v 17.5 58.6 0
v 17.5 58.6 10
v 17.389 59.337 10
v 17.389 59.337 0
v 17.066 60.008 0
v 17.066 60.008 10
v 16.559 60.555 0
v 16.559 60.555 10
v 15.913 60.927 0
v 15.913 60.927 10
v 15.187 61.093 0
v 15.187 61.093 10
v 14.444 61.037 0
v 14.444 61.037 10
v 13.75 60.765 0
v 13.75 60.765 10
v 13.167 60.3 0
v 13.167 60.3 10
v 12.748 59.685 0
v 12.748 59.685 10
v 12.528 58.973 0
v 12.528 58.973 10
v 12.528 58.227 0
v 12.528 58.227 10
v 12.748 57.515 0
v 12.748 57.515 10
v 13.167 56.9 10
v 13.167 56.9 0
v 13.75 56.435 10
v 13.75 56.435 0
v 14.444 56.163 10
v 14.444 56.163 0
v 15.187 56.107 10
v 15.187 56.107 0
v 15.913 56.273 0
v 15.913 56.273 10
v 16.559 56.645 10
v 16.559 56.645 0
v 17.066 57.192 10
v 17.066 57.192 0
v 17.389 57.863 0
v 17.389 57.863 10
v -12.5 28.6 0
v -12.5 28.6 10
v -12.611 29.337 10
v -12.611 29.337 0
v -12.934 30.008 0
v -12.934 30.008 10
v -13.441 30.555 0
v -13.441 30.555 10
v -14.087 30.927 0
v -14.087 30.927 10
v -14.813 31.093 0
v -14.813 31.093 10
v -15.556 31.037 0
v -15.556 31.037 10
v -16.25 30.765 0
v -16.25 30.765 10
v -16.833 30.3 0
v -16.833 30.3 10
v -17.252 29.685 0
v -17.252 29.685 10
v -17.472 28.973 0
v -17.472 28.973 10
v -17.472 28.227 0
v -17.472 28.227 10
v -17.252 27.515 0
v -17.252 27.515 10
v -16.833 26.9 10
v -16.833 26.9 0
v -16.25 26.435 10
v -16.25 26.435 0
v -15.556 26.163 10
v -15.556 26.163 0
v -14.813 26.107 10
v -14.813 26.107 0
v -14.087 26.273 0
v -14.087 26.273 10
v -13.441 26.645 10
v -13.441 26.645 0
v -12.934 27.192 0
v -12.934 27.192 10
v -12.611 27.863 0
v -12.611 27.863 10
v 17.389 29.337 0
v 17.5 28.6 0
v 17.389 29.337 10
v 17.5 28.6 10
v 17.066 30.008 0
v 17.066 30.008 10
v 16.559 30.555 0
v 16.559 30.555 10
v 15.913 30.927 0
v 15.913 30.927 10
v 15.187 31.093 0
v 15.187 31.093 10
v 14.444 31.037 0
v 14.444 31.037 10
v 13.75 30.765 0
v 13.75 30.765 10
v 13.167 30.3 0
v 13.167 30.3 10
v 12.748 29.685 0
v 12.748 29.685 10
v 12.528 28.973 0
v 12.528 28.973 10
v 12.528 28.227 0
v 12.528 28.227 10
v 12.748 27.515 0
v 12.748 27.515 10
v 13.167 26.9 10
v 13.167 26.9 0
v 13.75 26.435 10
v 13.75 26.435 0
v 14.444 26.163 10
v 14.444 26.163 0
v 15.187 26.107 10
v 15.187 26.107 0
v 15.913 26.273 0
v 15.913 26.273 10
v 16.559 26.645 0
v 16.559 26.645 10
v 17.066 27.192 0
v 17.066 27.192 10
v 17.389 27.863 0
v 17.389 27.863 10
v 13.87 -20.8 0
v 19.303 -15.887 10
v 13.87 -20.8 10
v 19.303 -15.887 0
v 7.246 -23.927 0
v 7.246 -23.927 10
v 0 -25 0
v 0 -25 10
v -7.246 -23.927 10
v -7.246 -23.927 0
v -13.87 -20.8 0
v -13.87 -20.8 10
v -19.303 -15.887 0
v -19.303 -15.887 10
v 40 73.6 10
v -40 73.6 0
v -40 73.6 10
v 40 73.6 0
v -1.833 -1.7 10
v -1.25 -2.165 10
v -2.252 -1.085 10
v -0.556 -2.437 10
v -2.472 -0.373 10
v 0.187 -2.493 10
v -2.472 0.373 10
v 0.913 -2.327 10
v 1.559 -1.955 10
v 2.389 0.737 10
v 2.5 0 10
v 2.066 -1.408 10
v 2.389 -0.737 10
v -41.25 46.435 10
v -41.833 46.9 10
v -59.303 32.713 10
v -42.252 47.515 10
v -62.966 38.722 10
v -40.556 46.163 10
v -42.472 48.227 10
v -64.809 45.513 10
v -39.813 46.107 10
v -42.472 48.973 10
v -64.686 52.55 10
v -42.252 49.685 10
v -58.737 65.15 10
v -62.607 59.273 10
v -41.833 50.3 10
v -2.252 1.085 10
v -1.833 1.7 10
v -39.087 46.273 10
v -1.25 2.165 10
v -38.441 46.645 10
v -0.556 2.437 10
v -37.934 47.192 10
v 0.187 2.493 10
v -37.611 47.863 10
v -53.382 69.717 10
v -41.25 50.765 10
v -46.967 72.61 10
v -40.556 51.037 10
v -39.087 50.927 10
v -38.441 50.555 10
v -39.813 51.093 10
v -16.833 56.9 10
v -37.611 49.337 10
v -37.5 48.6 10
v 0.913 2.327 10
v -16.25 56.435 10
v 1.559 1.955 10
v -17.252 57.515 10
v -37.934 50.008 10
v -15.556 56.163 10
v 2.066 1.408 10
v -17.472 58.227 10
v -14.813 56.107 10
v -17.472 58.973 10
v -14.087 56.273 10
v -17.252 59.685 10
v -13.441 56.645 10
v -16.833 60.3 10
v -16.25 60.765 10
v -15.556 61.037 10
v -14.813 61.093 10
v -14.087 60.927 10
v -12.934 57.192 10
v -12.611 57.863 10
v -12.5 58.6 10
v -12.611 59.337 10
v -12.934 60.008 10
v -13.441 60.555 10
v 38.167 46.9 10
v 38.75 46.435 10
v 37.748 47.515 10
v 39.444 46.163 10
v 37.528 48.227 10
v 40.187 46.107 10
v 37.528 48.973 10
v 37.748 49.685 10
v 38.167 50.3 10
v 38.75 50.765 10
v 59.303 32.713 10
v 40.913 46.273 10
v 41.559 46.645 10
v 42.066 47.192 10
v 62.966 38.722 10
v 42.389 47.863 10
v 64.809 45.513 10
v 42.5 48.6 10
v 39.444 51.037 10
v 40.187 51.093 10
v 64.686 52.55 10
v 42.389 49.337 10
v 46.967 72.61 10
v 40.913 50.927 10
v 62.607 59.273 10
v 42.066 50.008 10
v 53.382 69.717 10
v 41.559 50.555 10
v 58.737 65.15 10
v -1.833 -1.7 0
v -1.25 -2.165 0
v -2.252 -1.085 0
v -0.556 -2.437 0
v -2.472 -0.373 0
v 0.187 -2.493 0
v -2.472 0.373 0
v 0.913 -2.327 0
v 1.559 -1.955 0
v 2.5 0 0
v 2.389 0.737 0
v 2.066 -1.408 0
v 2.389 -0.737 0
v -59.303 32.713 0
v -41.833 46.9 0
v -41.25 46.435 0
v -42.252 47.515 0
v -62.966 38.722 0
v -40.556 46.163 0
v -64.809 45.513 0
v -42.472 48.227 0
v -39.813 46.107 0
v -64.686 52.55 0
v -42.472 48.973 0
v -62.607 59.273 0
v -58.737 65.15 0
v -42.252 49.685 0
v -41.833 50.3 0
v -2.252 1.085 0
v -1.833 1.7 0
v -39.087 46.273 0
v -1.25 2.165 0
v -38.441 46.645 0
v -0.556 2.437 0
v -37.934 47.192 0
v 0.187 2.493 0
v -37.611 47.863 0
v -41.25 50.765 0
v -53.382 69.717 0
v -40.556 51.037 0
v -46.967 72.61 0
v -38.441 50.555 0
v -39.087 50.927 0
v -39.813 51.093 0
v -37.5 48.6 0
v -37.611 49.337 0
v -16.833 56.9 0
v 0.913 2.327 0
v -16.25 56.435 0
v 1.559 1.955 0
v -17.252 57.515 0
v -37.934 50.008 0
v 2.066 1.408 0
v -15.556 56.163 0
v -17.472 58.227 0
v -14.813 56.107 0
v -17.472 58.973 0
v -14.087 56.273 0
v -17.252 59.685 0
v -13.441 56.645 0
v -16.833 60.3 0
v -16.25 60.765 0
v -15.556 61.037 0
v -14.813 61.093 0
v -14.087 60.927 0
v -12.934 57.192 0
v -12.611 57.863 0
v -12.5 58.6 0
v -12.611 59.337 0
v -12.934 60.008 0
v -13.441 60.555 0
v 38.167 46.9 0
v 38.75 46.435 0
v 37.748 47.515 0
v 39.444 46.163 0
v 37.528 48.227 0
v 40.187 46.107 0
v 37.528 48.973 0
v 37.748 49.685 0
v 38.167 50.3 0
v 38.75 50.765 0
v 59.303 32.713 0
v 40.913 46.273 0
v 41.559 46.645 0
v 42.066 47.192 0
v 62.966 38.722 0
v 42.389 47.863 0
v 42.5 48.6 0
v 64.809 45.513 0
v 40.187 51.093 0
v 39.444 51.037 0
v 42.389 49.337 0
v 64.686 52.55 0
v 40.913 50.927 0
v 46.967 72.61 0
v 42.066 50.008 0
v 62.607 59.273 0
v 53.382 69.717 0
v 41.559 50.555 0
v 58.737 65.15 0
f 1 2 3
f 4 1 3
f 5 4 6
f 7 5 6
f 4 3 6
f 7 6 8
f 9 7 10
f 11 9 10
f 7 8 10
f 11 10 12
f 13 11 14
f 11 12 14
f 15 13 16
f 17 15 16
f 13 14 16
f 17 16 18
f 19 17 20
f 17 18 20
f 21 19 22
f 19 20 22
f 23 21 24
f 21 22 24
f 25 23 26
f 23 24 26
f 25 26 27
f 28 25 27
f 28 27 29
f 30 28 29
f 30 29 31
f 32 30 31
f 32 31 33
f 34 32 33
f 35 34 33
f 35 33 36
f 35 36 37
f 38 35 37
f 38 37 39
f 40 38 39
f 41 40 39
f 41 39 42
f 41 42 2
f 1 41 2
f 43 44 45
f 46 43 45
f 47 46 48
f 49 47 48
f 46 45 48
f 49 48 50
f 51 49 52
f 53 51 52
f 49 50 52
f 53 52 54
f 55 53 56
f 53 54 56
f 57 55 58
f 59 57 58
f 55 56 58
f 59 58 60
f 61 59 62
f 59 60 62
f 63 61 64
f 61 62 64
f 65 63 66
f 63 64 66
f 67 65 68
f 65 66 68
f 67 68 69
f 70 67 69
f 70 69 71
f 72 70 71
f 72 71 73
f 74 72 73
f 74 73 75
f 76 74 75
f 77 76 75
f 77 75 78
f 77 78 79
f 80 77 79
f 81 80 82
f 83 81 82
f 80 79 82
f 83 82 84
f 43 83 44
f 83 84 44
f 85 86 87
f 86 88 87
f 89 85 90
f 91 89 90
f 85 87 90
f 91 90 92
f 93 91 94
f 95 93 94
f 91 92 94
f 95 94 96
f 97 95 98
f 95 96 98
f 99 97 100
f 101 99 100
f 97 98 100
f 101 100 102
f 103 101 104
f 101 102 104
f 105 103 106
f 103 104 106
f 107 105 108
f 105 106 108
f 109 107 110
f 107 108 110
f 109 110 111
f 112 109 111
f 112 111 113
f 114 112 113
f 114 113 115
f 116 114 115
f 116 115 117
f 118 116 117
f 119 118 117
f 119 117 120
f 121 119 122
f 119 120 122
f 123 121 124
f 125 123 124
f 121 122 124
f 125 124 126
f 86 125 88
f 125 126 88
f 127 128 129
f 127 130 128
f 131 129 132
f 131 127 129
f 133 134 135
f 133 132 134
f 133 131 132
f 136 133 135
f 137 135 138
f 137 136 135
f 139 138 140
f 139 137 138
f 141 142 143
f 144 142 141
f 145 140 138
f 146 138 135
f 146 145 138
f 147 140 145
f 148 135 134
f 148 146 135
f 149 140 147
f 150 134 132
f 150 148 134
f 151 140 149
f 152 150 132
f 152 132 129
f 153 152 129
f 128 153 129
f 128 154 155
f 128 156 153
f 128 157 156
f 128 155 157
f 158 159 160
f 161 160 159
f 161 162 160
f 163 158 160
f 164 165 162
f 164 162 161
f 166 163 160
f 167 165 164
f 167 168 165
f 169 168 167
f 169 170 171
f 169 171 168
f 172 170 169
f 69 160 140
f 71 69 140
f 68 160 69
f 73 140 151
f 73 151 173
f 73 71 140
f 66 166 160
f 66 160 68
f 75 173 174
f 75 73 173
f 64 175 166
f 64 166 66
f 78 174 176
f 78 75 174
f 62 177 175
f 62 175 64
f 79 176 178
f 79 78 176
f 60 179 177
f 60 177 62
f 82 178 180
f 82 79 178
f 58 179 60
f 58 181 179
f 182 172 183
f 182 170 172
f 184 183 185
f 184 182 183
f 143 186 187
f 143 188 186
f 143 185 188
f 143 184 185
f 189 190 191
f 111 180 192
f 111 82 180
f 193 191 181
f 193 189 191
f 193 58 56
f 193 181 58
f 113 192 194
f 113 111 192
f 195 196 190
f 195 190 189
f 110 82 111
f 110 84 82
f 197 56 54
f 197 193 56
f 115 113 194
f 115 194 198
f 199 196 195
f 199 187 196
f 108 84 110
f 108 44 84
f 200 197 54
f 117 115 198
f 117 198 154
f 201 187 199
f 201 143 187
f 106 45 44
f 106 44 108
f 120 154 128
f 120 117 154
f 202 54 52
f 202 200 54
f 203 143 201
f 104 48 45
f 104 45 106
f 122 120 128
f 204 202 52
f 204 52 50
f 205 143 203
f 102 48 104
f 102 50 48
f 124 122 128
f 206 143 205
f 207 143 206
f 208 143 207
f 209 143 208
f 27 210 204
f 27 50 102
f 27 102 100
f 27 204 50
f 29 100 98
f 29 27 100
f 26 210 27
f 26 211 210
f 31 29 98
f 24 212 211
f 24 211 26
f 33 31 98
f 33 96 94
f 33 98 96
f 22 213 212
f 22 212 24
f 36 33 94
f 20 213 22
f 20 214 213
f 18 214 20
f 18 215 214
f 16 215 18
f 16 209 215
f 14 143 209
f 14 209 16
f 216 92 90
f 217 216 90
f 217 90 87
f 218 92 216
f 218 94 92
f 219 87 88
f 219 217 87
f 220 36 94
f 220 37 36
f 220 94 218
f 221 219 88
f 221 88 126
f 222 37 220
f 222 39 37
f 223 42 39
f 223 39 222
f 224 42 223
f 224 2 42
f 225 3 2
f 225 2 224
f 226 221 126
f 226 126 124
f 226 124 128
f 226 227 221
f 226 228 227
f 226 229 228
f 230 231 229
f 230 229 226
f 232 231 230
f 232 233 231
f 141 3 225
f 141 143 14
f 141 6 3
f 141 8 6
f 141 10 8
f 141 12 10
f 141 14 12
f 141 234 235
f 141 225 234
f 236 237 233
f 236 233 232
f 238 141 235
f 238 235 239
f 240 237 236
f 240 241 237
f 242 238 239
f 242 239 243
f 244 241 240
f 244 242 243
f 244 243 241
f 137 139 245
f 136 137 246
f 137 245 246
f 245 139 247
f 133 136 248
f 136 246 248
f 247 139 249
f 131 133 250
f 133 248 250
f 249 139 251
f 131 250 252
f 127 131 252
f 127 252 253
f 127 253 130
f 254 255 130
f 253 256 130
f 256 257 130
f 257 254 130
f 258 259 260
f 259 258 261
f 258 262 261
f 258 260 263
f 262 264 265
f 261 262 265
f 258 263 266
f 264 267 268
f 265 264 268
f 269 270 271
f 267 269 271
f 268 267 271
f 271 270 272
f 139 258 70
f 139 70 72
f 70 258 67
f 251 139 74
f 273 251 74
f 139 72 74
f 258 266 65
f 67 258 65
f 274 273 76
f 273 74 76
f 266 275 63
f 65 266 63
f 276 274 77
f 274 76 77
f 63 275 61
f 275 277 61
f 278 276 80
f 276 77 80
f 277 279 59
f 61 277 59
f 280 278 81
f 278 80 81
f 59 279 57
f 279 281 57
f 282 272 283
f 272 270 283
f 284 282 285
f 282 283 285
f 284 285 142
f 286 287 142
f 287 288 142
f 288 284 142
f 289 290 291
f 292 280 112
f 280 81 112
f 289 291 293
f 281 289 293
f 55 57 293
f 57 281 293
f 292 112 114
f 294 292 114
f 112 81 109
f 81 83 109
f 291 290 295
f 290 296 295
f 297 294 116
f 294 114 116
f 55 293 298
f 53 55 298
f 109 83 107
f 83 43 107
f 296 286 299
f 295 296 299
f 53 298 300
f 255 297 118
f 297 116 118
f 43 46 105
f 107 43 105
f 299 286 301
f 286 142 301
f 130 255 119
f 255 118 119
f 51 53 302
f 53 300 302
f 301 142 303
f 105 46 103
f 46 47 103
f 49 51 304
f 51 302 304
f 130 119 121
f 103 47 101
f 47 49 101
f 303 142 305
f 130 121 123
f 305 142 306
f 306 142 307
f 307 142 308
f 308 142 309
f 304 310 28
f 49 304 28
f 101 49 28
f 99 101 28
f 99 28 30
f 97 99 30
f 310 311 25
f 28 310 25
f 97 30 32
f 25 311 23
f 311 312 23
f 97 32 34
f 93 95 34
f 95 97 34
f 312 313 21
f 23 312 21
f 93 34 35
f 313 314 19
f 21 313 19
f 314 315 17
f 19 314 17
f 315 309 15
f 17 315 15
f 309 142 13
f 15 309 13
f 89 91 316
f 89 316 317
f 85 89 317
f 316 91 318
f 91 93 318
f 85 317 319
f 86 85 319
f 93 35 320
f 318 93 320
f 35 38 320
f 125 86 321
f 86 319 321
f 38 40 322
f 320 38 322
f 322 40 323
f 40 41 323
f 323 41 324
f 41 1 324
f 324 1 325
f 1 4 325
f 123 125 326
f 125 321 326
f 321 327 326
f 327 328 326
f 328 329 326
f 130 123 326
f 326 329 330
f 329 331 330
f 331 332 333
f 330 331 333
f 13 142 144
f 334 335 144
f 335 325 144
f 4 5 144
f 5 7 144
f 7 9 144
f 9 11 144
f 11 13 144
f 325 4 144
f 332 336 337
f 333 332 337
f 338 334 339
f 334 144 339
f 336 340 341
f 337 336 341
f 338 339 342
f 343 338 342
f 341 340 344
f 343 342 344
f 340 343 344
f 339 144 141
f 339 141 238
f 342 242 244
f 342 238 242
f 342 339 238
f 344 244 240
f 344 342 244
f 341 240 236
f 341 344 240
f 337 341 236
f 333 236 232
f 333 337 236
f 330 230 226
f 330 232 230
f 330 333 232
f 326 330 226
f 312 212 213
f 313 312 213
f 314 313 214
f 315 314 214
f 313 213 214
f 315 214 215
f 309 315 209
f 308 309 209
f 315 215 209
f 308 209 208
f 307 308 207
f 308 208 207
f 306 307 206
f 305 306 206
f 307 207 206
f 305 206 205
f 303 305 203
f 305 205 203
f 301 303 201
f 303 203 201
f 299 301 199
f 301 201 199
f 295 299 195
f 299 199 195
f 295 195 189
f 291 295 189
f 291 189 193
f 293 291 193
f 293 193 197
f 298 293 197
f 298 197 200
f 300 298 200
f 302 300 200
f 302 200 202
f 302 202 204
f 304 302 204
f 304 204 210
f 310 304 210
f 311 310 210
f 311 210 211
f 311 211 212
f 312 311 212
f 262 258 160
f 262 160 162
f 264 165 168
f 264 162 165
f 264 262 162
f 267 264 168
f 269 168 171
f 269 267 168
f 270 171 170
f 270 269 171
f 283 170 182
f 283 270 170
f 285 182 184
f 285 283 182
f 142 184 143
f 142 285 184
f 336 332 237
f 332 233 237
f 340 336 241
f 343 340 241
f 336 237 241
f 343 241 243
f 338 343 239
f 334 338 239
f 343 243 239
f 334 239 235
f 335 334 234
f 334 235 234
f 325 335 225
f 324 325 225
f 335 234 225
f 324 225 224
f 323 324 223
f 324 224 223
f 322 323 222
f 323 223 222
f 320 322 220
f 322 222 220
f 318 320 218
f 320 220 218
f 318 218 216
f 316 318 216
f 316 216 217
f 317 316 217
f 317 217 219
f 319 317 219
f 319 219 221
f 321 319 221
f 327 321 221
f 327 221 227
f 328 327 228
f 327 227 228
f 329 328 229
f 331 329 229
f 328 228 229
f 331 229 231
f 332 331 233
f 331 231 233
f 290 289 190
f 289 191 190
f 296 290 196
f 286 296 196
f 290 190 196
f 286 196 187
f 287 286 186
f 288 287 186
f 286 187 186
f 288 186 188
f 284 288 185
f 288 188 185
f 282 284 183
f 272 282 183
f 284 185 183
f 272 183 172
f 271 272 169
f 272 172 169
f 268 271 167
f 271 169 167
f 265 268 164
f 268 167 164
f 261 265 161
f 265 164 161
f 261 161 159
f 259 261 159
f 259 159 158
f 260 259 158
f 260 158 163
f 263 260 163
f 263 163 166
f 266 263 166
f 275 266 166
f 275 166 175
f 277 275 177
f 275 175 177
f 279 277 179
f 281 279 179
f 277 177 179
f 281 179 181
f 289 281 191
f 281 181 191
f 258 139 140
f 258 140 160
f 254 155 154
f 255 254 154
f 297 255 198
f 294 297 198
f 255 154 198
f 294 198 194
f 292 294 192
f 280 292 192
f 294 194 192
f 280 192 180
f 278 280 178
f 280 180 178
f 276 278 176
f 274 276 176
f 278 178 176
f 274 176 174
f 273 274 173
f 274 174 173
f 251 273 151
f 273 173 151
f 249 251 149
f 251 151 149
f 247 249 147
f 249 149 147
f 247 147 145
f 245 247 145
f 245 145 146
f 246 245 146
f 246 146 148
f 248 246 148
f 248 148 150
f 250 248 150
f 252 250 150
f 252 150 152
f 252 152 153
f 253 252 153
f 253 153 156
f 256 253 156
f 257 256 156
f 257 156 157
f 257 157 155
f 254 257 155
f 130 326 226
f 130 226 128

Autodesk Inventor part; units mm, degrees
ref_plane "YZ Plane" through (0, 0, 0) normal (1, 0, 0) x (0, 1, 0)
ref_plane "XZ Plane" through (0, 0, 0) normal (0, 1, 0) x (-1, 0, 0)
ref_plane "XY Plane" through (0, 0, 0) normal (0, 0, 1) x (1, 0, 0)
sketch "Sketch1" plane through (0, 0, 0) normal (0, 0, 1) x (1, 0, 0)
  circle A0 centre (0, 0) radius 25
  circle A1 centre (40, 48.6) radius 25
  circle A2 centre (-40, 48.6) radius 25
  line L0 (-40, 73.6) -> (40, 73.6)
  line L1 (59.3028, 32.7129) -> (19.3028, -15.8871)
  line L2 (-19.3028, -15.8871) -> (-59.3028, 32.7129)
  dimension "d0" = 50
  dimension "d1" = 50
  dimension "d2" = 50
  dimension "d3" = 40
  dimension "d4" = 40
  dimension "d5" = 48.6
  dimension "d6" = 48.6
extrude "Extrusion1" add sketch "Sketch1" along normal blind 10
sketch "Sketch2" plane through (0, 0, 10) normal (0, 0, 1) x (1, 0, 0)
  arc A0 (-40, 73.6) -> (-59.3028, 32.7129) centre (-40, 48.6) ccw projected
  line L0 (-59.3028, 32.7129) -> (-19.3028, -15.8871) projected
  arc A1 (-19.3028, -15.8871) -> (19.3028, -15.8871) centre (0, 0) ccw projected
  line L1 (19.3028, -15.8871) -> (59.3028, 32.7129) projected
  arc A2 (59.3028, 32.7129) -> (40, 73.6) centre (40, 48.6) ccw projected
  line L2 (40, 73.6) -> (-40, 73.6) projected
  circle A3 centre (40, 48.6) radius 2.5
  circle A4 centre (0, 0) radius 2.5
  circle A5 centre (-40, 48.6) radius 2.5
  dimension "d10" = 5
  dimension "d11" = 5
  dimension "d12" = 5
extrude "Extrusion2" cut sketch "Sketch2" against normal up to next contours A3 | A4 | A5
sketch "Sketch3" plane through (0, 0, 10) normal (0, 0, 1) x (1, 0, 0)
  circle A0 centre (-15, 58.6) radius 2.5
  circle A1 centre (15, 58.6) radius 2.5
  circle A2 centre (-15, 28.6) radius 2.5
  circle A3 centre (15, 28.6) radius 2.5
  circle A4 centre (0, 0) radius 2.5 projected
  circle A5 centre (40, 48.6) radius 2.5 projected
  circle A6 centre (-40, 48.6) radius 2.5 projected
  arc A7 (-40, 73.6) -> (-59.3028, 32.7129) centre (-40, 48.6) ccw projected
  line L0 (-59.3028, 32.7129) -> (-19.3028, -15.8871) projected
  arc A8 (-19.3028, -15.8871) -> (19.3028, -15.8871) centre (0, 0) ccw projected
  line L1 (19.3028, -15.8871) -> (59.3028, 32.7129) projected
  arc A9 (59.3028, 32.7129) -> (40, 73.6) centre (40, 48.6) ccw projected
  line L2 (40, 73.6) -> (-40, 73.6) projected
  dimension "d15" = 5
  dimension "d16" = 5
  dimension "d17" = 5
  dimension "d18" = 5
  dimension "d19" = 30
  dimension "d20" = 30
  dimension "d21" = 30
  dimension "d22" = 30
  dimension "d23" = 15
  dimension "d24" = 15
  dimension "d25" = 15
  dimension "d26" = 15
extrude "Extrusion3" cut sketch "Sketch3" against normal up to next contours A0 | A1 | A2 | A3
properties part number "Arm_Base-SquareBar-Rev3-2" material "Bronze, Cast"
